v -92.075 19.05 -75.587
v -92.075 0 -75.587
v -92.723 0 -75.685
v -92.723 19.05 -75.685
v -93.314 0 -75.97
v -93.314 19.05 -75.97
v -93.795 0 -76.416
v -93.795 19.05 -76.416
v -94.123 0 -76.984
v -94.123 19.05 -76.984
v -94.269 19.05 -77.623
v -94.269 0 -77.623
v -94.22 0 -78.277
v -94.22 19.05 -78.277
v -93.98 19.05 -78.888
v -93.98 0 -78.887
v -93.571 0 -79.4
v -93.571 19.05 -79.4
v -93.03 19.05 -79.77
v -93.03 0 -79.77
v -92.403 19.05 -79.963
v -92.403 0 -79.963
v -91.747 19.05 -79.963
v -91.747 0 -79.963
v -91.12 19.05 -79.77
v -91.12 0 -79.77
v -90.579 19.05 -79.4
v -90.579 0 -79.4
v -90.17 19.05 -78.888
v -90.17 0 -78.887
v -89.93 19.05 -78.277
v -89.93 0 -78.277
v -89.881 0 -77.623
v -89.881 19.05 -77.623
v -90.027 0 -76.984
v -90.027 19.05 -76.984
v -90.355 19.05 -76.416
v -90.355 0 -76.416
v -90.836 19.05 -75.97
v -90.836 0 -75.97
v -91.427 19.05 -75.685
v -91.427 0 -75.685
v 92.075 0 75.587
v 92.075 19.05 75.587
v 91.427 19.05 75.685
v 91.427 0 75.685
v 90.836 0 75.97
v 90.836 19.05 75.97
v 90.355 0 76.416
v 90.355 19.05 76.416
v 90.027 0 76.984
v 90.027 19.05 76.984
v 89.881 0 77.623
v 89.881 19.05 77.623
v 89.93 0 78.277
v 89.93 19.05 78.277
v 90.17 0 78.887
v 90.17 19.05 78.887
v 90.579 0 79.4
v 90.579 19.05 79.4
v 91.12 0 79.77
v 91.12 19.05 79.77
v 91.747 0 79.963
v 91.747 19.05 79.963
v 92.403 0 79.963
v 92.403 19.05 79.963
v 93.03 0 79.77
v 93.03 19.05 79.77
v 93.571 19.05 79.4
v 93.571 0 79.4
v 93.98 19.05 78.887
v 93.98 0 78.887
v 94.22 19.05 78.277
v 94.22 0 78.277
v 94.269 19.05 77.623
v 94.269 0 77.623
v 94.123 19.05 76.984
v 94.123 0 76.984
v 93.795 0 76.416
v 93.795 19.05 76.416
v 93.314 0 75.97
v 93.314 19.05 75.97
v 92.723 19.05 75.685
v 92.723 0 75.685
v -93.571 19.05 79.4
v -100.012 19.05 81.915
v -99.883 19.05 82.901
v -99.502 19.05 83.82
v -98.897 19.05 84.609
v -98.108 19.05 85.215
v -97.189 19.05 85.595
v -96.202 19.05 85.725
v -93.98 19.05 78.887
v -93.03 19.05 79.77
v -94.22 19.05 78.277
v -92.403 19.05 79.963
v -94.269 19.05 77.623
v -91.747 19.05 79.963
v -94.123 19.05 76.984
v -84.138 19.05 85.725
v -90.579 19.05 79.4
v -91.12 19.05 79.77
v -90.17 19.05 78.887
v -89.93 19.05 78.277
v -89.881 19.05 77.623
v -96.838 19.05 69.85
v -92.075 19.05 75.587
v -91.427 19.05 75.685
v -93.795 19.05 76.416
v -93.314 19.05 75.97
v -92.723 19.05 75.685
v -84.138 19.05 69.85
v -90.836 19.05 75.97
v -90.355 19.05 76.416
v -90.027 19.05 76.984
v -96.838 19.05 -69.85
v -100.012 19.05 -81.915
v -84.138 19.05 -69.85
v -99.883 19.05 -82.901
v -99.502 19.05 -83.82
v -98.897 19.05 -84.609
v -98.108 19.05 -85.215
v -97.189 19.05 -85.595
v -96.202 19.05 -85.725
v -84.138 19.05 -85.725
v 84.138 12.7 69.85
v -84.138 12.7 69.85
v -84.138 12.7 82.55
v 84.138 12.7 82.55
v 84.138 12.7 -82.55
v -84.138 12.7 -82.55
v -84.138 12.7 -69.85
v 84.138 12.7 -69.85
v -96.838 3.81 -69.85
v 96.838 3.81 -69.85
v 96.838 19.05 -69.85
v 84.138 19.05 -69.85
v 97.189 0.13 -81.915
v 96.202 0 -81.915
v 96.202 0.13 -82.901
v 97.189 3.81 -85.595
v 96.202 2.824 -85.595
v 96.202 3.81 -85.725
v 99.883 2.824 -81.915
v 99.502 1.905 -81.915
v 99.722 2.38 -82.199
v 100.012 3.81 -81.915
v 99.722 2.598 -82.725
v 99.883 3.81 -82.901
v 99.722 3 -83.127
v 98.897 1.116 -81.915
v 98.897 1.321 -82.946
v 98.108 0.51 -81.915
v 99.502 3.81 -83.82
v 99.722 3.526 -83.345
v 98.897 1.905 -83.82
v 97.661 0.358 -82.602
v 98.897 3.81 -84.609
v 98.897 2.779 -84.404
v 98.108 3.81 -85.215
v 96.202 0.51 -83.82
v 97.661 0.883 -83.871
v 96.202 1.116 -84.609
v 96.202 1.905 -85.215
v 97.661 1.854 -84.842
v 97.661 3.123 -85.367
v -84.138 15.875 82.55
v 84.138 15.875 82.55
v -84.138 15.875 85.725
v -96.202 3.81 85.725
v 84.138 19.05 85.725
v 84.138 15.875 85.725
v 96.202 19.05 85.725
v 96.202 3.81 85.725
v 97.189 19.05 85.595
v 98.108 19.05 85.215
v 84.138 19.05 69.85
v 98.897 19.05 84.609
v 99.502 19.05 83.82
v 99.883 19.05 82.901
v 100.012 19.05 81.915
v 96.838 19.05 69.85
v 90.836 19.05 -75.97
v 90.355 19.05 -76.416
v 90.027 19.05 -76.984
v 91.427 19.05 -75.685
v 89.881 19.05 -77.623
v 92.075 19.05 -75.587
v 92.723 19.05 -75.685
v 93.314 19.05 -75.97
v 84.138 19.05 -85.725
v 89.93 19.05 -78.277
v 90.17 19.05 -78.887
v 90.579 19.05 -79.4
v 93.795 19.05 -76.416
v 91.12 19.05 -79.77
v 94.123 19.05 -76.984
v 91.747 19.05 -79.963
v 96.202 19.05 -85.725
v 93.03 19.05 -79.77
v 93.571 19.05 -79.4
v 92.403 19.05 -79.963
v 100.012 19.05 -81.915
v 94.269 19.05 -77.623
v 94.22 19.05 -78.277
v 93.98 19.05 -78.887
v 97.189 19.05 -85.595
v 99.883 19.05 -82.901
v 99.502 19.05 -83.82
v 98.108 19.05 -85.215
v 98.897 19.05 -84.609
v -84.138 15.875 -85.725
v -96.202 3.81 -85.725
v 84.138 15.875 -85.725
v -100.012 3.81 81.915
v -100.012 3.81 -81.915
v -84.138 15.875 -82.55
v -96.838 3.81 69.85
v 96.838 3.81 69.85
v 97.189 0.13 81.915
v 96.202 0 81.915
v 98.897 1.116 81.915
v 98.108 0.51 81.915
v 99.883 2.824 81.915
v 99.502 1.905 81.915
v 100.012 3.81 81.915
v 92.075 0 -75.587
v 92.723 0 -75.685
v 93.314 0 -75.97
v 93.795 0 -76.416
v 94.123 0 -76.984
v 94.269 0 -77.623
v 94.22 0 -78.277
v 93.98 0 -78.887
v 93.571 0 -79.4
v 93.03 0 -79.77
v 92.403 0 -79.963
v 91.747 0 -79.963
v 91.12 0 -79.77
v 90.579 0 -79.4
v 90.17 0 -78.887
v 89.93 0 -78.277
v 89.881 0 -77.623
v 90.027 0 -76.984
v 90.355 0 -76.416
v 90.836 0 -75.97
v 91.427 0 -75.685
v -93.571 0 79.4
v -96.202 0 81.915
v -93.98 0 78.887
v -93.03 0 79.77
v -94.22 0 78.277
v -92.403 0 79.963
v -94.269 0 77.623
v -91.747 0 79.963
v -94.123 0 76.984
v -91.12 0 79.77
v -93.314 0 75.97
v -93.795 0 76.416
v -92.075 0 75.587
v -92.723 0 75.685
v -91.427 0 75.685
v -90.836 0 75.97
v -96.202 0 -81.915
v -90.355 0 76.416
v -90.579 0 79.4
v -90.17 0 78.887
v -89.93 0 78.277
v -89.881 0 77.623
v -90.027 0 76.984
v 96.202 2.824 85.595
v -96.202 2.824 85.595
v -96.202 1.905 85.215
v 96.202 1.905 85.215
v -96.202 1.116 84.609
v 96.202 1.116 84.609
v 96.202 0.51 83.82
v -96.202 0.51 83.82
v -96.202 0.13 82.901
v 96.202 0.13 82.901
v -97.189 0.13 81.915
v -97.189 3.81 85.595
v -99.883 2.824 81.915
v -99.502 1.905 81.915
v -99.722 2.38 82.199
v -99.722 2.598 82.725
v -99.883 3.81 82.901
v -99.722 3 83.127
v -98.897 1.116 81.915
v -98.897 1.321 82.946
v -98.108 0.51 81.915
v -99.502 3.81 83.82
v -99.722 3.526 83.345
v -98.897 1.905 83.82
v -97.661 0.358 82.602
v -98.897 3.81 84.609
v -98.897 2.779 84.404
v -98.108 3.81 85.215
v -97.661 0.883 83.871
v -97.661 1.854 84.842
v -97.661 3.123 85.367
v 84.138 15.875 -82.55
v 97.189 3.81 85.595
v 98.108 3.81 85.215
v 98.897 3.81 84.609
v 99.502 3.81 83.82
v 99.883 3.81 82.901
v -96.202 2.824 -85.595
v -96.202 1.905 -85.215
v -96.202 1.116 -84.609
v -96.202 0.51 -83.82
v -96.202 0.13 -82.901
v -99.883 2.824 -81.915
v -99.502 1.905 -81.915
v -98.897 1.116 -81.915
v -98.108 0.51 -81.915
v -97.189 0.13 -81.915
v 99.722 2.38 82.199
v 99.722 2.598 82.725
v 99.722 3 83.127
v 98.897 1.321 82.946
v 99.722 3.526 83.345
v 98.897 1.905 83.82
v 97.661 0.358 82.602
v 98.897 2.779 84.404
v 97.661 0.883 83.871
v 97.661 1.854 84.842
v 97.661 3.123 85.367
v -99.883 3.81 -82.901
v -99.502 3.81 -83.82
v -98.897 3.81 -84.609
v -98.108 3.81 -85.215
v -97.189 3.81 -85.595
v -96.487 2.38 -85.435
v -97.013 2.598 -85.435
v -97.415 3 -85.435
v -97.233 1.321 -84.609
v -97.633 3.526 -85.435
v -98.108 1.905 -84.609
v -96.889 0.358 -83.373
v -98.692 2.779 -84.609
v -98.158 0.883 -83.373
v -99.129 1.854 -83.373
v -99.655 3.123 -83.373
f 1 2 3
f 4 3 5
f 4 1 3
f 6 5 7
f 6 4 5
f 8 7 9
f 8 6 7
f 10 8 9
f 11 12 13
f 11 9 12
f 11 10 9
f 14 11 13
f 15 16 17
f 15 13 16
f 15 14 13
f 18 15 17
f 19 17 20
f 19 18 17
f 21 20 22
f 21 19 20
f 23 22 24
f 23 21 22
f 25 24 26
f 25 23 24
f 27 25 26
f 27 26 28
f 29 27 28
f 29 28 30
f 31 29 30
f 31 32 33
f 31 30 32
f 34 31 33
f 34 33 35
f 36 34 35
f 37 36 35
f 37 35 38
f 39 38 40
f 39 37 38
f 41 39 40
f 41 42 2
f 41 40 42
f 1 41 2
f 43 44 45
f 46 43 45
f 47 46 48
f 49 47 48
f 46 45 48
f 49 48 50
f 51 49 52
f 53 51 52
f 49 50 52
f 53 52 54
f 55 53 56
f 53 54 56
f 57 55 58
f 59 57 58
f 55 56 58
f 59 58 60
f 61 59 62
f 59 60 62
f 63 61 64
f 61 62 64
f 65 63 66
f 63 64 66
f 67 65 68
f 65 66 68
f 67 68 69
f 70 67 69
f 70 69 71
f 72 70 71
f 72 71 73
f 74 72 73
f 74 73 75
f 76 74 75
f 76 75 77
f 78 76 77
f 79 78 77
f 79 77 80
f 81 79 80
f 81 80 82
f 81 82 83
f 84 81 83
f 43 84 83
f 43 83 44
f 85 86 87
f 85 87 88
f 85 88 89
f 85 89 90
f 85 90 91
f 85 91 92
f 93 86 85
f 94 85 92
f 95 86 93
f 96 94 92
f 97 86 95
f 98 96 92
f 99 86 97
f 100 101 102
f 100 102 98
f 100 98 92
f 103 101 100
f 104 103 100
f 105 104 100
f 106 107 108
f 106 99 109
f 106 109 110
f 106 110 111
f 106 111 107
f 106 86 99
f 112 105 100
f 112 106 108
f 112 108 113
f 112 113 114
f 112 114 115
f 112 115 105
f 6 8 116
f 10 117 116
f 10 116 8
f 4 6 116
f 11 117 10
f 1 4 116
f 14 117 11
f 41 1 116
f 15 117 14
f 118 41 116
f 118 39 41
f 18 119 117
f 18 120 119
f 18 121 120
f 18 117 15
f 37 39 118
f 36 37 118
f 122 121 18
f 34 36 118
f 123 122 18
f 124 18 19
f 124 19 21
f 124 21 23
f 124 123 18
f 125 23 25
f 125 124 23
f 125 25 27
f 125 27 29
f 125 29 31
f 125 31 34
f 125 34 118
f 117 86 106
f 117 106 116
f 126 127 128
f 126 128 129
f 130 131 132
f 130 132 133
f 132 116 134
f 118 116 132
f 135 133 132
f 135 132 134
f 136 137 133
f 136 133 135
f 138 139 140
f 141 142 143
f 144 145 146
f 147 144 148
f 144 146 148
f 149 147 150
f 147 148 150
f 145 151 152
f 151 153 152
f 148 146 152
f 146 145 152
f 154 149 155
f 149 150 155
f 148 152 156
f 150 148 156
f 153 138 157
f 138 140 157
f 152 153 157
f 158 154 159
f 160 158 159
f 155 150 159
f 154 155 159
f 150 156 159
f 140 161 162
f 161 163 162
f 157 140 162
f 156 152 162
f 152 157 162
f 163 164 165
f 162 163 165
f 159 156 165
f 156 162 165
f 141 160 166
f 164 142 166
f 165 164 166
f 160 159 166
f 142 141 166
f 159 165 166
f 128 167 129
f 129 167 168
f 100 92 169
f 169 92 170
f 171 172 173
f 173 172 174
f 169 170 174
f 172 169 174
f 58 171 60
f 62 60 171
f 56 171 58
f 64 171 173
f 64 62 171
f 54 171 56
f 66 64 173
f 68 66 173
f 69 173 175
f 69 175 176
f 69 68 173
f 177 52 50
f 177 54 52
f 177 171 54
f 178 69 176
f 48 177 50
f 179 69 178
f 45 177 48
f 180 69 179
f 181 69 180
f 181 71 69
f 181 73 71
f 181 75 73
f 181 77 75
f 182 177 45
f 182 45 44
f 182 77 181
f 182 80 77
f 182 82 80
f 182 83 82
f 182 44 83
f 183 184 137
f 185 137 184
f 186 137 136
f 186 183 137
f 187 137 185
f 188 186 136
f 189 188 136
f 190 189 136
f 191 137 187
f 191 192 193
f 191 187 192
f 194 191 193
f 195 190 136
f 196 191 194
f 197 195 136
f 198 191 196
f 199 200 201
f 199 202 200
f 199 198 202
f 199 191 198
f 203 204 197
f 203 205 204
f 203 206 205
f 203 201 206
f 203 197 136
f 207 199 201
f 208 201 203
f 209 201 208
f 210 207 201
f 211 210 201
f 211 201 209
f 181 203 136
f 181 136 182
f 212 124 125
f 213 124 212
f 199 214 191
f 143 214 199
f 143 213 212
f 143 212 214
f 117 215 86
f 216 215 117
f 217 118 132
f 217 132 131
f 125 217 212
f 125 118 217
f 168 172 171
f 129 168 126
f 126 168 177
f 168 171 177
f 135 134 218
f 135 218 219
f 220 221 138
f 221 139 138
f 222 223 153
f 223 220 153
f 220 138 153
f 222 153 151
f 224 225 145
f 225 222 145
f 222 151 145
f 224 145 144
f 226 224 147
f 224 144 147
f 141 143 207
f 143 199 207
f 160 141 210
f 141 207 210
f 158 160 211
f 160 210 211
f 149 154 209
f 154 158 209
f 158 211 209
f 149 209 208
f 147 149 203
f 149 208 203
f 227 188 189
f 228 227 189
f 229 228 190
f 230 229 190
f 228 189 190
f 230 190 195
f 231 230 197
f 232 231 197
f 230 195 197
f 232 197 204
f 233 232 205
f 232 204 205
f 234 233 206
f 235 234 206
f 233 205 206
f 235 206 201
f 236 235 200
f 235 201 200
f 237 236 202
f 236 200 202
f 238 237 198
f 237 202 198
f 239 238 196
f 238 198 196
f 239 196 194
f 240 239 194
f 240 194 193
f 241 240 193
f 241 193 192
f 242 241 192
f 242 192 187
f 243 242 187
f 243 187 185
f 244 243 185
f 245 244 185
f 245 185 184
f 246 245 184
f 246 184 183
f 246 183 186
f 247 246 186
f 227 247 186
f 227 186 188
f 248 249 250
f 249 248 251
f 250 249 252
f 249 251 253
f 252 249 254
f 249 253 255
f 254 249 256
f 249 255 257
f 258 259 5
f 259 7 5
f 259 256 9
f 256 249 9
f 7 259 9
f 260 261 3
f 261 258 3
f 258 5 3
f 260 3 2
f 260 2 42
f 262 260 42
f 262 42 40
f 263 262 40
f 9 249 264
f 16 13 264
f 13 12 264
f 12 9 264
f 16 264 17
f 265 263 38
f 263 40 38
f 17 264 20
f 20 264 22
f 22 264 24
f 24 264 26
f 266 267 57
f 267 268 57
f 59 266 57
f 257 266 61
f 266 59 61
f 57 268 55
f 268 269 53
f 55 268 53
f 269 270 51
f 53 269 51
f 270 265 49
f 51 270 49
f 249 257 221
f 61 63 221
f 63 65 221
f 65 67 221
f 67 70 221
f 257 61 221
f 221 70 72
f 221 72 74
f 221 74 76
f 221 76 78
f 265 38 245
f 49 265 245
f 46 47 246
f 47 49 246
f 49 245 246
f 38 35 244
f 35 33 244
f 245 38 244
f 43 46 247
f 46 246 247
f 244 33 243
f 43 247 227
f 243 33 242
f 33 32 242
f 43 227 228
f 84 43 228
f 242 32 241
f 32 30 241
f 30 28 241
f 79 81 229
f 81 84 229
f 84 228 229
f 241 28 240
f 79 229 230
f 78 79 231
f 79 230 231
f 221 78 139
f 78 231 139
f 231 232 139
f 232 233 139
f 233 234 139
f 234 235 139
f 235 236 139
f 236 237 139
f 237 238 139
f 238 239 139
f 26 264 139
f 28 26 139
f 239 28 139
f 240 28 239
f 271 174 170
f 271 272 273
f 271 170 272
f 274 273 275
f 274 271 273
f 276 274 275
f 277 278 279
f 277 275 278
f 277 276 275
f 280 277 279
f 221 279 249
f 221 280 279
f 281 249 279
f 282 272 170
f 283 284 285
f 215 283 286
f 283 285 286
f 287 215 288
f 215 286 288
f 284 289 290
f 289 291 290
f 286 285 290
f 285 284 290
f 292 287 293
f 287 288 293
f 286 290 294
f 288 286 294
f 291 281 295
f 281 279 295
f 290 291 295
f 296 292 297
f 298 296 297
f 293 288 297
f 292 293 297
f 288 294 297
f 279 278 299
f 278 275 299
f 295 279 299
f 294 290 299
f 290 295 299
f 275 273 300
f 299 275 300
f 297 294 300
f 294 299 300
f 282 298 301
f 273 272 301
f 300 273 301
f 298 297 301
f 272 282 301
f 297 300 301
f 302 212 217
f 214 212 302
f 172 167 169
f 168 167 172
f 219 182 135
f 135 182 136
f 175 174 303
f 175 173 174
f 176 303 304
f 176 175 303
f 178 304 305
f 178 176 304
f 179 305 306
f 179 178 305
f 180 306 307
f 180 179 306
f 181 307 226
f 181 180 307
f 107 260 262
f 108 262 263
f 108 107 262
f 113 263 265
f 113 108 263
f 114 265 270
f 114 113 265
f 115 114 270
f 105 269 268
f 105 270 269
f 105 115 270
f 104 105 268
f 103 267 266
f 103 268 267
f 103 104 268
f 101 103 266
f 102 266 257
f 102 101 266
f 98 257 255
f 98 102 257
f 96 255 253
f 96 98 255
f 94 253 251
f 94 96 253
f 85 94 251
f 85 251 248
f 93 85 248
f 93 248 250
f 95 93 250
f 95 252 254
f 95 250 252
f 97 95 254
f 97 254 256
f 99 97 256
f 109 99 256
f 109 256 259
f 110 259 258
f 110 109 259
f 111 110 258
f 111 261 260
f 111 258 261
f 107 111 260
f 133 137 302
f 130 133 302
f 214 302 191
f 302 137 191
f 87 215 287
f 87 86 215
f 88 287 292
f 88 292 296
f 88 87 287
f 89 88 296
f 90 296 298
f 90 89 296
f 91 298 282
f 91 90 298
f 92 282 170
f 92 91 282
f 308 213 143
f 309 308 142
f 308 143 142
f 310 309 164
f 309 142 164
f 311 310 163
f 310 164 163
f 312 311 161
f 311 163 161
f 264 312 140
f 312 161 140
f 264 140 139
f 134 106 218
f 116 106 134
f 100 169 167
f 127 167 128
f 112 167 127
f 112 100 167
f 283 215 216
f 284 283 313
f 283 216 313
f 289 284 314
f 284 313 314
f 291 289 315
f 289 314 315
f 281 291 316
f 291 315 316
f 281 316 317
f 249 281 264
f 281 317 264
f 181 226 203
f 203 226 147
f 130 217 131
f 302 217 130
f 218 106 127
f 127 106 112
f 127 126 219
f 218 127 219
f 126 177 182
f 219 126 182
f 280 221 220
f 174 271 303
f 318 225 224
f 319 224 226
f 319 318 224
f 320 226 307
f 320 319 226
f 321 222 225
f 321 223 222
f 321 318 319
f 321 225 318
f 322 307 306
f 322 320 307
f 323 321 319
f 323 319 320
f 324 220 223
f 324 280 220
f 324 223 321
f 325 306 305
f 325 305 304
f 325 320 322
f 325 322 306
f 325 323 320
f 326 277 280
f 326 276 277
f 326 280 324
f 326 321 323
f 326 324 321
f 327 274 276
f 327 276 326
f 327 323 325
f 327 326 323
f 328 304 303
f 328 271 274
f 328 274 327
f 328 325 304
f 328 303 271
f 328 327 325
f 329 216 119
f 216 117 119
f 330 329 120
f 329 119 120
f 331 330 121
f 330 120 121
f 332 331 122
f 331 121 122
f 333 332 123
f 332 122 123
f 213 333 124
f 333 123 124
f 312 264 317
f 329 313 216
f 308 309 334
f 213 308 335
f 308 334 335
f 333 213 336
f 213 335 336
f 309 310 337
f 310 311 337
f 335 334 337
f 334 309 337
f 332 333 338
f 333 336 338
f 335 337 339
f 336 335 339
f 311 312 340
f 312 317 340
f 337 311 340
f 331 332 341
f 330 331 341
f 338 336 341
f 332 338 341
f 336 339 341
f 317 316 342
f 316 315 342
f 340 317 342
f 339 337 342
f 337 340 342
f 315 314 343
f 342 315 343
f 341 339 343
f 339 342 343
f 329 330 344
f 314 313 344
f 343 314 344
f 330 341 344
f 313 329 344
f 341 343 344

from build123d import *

# Parameters (mm, degrees)
SKETCH1_W           = 200.025
SKETCH1_H           = 171.45
BOSS_EXTRUDE1_DEPTH = 19.05
SKETCH2_W           = 193.675
SKETCH2_H           = 139.7
CUT_EXTRUDE1_DEPTH  = 15.24
SKETCH4_W           = 168.275
SKETCH4_H           = 171.45
CUT_EXTRUDE2_DEPTH  = 3.175
SKETCH5_W           = 168.275
SKETCH5_H           = 12.7
CUT_EXTRUDE3_DEPTH  = 3.175
SKETCH7_W           = 168.275
SKETCH7_H           = 12.7
CUT_EXTRUDE5_DEPTH  = 3.175
SKETCH11_R          = 2.2
CUT_EXTRUDE6_DEPTH  = 33.5
FILLET3_R           = 3.81


with BuildPart() as part:
    # Sketch1 → Boss-Extrude1 (new body)
    with BuildSketch(Plane(origin=(0, 0, 0), x_dir=(1, 0, 0), z_dir=(0, 1, 0))):
        Rectangle(SKETCH1_W, SKETCH1_H)
    extrude(amount=BOSS_EXTRUDE1_DEPTH)

    # Sketch2 → Cut-Extrude1 (cut)
    with BuildSketch(Plane(origin=(0, 19.05, 0), x_dir=(1, 0, 0), z_dir=(0, 1, 0))):
        Rectangle(SKETCH2_W, SKETCH2_H)
    extrude(amount=-CUT_EXTRUDE1_DEPTH, mode=Mode.SUBTRACT)

    # Sketch4 → Cut-Extrude2 (cut)
    with BuildSketch(Plane(origin=(0, 19.05, 0), x_dir=(1, 0, 0), z_dir=(0, 1, 0))):
        Rectangle(SKETCH4_W, SKETCH4_H)
    extrude(amount=-CUT_EXTRUDE2_DEPTH, mode=Mode.SUBTRACT)

    # Sketch5 → Cut-Extrude3 (cut)
    with BuildSketch(Plane(origin=(0, 15.875, 0), x_dir=(1, 0, 0), z_dir=(0, 1, 0))):
        with Locations((0, -76.2)):
            Rectangle(SKETCH5_W, SKETCH5_H)
    extrude(amount=-CUT_EXTRUDE3_DEPTH, mode=Mode.SUBTRACT)

    # Sketch7 → Cut-Extrude5 (cut)
    with BuildSketch(Plane(origin=(0, 15.875, 0), x_dir=(1, 0, 0), z_dir=(0, 1, 0))):
        with Locations((0, 76.2)):
            Rectangle(SKETCH7_W, SKETCH7_H)
    extrude(amount=-CUT_EXTRUDE5_DEPTH, mode=Mode.SUBTRACT)

    # Sketch11 → Cut-Extrude6 (cut)
    with BuildSketch(Plane(origin=(0, 19.05, 0), x_dir=(1, 0, 0), z_dir=(0, 1, 0))):
        with Locations(Location((92.075, 77.7875, 0), (0, 0, 270))):
            Circle(SKETCH11_R)
        with Locations(Location((92.075, -77.7875, 0), (0, 0, 90))):
            Circle(SKETCH11_R)
    cut_extrude6 = extrude(amount=-CUT_EXTRUDE6_DEPTH, mode=Mode.SUBTRACT)

    # Fillet3
    fillet3_edges = [part.edges().sort_by_distance(p)[0] for p in [
        (0, 0, 85.725),
        (-100.0125, 0, 0),
        (0, 0, -85.725),
        (100.0125, 0, 0),
        (100.0125, 9.525, 85.725),
        (-100.0125, 9.525, 85.725),
        (-100.0125, 9.525, -85.725),
        (100.0125, 9.525, -85.725),
    ]]
    fillet(fillet3_edges, radius=FILLET3_R)

    # Mirror1: Cut-Extrude6 across plane
    add(cut_extrude6.mirror(Plane(origin=(0, 0, 0), x_dir=(0, 0, 1), z_dir=(1, 0, 0))), mode=Mode.SUBTRACT)


solid = part.part
